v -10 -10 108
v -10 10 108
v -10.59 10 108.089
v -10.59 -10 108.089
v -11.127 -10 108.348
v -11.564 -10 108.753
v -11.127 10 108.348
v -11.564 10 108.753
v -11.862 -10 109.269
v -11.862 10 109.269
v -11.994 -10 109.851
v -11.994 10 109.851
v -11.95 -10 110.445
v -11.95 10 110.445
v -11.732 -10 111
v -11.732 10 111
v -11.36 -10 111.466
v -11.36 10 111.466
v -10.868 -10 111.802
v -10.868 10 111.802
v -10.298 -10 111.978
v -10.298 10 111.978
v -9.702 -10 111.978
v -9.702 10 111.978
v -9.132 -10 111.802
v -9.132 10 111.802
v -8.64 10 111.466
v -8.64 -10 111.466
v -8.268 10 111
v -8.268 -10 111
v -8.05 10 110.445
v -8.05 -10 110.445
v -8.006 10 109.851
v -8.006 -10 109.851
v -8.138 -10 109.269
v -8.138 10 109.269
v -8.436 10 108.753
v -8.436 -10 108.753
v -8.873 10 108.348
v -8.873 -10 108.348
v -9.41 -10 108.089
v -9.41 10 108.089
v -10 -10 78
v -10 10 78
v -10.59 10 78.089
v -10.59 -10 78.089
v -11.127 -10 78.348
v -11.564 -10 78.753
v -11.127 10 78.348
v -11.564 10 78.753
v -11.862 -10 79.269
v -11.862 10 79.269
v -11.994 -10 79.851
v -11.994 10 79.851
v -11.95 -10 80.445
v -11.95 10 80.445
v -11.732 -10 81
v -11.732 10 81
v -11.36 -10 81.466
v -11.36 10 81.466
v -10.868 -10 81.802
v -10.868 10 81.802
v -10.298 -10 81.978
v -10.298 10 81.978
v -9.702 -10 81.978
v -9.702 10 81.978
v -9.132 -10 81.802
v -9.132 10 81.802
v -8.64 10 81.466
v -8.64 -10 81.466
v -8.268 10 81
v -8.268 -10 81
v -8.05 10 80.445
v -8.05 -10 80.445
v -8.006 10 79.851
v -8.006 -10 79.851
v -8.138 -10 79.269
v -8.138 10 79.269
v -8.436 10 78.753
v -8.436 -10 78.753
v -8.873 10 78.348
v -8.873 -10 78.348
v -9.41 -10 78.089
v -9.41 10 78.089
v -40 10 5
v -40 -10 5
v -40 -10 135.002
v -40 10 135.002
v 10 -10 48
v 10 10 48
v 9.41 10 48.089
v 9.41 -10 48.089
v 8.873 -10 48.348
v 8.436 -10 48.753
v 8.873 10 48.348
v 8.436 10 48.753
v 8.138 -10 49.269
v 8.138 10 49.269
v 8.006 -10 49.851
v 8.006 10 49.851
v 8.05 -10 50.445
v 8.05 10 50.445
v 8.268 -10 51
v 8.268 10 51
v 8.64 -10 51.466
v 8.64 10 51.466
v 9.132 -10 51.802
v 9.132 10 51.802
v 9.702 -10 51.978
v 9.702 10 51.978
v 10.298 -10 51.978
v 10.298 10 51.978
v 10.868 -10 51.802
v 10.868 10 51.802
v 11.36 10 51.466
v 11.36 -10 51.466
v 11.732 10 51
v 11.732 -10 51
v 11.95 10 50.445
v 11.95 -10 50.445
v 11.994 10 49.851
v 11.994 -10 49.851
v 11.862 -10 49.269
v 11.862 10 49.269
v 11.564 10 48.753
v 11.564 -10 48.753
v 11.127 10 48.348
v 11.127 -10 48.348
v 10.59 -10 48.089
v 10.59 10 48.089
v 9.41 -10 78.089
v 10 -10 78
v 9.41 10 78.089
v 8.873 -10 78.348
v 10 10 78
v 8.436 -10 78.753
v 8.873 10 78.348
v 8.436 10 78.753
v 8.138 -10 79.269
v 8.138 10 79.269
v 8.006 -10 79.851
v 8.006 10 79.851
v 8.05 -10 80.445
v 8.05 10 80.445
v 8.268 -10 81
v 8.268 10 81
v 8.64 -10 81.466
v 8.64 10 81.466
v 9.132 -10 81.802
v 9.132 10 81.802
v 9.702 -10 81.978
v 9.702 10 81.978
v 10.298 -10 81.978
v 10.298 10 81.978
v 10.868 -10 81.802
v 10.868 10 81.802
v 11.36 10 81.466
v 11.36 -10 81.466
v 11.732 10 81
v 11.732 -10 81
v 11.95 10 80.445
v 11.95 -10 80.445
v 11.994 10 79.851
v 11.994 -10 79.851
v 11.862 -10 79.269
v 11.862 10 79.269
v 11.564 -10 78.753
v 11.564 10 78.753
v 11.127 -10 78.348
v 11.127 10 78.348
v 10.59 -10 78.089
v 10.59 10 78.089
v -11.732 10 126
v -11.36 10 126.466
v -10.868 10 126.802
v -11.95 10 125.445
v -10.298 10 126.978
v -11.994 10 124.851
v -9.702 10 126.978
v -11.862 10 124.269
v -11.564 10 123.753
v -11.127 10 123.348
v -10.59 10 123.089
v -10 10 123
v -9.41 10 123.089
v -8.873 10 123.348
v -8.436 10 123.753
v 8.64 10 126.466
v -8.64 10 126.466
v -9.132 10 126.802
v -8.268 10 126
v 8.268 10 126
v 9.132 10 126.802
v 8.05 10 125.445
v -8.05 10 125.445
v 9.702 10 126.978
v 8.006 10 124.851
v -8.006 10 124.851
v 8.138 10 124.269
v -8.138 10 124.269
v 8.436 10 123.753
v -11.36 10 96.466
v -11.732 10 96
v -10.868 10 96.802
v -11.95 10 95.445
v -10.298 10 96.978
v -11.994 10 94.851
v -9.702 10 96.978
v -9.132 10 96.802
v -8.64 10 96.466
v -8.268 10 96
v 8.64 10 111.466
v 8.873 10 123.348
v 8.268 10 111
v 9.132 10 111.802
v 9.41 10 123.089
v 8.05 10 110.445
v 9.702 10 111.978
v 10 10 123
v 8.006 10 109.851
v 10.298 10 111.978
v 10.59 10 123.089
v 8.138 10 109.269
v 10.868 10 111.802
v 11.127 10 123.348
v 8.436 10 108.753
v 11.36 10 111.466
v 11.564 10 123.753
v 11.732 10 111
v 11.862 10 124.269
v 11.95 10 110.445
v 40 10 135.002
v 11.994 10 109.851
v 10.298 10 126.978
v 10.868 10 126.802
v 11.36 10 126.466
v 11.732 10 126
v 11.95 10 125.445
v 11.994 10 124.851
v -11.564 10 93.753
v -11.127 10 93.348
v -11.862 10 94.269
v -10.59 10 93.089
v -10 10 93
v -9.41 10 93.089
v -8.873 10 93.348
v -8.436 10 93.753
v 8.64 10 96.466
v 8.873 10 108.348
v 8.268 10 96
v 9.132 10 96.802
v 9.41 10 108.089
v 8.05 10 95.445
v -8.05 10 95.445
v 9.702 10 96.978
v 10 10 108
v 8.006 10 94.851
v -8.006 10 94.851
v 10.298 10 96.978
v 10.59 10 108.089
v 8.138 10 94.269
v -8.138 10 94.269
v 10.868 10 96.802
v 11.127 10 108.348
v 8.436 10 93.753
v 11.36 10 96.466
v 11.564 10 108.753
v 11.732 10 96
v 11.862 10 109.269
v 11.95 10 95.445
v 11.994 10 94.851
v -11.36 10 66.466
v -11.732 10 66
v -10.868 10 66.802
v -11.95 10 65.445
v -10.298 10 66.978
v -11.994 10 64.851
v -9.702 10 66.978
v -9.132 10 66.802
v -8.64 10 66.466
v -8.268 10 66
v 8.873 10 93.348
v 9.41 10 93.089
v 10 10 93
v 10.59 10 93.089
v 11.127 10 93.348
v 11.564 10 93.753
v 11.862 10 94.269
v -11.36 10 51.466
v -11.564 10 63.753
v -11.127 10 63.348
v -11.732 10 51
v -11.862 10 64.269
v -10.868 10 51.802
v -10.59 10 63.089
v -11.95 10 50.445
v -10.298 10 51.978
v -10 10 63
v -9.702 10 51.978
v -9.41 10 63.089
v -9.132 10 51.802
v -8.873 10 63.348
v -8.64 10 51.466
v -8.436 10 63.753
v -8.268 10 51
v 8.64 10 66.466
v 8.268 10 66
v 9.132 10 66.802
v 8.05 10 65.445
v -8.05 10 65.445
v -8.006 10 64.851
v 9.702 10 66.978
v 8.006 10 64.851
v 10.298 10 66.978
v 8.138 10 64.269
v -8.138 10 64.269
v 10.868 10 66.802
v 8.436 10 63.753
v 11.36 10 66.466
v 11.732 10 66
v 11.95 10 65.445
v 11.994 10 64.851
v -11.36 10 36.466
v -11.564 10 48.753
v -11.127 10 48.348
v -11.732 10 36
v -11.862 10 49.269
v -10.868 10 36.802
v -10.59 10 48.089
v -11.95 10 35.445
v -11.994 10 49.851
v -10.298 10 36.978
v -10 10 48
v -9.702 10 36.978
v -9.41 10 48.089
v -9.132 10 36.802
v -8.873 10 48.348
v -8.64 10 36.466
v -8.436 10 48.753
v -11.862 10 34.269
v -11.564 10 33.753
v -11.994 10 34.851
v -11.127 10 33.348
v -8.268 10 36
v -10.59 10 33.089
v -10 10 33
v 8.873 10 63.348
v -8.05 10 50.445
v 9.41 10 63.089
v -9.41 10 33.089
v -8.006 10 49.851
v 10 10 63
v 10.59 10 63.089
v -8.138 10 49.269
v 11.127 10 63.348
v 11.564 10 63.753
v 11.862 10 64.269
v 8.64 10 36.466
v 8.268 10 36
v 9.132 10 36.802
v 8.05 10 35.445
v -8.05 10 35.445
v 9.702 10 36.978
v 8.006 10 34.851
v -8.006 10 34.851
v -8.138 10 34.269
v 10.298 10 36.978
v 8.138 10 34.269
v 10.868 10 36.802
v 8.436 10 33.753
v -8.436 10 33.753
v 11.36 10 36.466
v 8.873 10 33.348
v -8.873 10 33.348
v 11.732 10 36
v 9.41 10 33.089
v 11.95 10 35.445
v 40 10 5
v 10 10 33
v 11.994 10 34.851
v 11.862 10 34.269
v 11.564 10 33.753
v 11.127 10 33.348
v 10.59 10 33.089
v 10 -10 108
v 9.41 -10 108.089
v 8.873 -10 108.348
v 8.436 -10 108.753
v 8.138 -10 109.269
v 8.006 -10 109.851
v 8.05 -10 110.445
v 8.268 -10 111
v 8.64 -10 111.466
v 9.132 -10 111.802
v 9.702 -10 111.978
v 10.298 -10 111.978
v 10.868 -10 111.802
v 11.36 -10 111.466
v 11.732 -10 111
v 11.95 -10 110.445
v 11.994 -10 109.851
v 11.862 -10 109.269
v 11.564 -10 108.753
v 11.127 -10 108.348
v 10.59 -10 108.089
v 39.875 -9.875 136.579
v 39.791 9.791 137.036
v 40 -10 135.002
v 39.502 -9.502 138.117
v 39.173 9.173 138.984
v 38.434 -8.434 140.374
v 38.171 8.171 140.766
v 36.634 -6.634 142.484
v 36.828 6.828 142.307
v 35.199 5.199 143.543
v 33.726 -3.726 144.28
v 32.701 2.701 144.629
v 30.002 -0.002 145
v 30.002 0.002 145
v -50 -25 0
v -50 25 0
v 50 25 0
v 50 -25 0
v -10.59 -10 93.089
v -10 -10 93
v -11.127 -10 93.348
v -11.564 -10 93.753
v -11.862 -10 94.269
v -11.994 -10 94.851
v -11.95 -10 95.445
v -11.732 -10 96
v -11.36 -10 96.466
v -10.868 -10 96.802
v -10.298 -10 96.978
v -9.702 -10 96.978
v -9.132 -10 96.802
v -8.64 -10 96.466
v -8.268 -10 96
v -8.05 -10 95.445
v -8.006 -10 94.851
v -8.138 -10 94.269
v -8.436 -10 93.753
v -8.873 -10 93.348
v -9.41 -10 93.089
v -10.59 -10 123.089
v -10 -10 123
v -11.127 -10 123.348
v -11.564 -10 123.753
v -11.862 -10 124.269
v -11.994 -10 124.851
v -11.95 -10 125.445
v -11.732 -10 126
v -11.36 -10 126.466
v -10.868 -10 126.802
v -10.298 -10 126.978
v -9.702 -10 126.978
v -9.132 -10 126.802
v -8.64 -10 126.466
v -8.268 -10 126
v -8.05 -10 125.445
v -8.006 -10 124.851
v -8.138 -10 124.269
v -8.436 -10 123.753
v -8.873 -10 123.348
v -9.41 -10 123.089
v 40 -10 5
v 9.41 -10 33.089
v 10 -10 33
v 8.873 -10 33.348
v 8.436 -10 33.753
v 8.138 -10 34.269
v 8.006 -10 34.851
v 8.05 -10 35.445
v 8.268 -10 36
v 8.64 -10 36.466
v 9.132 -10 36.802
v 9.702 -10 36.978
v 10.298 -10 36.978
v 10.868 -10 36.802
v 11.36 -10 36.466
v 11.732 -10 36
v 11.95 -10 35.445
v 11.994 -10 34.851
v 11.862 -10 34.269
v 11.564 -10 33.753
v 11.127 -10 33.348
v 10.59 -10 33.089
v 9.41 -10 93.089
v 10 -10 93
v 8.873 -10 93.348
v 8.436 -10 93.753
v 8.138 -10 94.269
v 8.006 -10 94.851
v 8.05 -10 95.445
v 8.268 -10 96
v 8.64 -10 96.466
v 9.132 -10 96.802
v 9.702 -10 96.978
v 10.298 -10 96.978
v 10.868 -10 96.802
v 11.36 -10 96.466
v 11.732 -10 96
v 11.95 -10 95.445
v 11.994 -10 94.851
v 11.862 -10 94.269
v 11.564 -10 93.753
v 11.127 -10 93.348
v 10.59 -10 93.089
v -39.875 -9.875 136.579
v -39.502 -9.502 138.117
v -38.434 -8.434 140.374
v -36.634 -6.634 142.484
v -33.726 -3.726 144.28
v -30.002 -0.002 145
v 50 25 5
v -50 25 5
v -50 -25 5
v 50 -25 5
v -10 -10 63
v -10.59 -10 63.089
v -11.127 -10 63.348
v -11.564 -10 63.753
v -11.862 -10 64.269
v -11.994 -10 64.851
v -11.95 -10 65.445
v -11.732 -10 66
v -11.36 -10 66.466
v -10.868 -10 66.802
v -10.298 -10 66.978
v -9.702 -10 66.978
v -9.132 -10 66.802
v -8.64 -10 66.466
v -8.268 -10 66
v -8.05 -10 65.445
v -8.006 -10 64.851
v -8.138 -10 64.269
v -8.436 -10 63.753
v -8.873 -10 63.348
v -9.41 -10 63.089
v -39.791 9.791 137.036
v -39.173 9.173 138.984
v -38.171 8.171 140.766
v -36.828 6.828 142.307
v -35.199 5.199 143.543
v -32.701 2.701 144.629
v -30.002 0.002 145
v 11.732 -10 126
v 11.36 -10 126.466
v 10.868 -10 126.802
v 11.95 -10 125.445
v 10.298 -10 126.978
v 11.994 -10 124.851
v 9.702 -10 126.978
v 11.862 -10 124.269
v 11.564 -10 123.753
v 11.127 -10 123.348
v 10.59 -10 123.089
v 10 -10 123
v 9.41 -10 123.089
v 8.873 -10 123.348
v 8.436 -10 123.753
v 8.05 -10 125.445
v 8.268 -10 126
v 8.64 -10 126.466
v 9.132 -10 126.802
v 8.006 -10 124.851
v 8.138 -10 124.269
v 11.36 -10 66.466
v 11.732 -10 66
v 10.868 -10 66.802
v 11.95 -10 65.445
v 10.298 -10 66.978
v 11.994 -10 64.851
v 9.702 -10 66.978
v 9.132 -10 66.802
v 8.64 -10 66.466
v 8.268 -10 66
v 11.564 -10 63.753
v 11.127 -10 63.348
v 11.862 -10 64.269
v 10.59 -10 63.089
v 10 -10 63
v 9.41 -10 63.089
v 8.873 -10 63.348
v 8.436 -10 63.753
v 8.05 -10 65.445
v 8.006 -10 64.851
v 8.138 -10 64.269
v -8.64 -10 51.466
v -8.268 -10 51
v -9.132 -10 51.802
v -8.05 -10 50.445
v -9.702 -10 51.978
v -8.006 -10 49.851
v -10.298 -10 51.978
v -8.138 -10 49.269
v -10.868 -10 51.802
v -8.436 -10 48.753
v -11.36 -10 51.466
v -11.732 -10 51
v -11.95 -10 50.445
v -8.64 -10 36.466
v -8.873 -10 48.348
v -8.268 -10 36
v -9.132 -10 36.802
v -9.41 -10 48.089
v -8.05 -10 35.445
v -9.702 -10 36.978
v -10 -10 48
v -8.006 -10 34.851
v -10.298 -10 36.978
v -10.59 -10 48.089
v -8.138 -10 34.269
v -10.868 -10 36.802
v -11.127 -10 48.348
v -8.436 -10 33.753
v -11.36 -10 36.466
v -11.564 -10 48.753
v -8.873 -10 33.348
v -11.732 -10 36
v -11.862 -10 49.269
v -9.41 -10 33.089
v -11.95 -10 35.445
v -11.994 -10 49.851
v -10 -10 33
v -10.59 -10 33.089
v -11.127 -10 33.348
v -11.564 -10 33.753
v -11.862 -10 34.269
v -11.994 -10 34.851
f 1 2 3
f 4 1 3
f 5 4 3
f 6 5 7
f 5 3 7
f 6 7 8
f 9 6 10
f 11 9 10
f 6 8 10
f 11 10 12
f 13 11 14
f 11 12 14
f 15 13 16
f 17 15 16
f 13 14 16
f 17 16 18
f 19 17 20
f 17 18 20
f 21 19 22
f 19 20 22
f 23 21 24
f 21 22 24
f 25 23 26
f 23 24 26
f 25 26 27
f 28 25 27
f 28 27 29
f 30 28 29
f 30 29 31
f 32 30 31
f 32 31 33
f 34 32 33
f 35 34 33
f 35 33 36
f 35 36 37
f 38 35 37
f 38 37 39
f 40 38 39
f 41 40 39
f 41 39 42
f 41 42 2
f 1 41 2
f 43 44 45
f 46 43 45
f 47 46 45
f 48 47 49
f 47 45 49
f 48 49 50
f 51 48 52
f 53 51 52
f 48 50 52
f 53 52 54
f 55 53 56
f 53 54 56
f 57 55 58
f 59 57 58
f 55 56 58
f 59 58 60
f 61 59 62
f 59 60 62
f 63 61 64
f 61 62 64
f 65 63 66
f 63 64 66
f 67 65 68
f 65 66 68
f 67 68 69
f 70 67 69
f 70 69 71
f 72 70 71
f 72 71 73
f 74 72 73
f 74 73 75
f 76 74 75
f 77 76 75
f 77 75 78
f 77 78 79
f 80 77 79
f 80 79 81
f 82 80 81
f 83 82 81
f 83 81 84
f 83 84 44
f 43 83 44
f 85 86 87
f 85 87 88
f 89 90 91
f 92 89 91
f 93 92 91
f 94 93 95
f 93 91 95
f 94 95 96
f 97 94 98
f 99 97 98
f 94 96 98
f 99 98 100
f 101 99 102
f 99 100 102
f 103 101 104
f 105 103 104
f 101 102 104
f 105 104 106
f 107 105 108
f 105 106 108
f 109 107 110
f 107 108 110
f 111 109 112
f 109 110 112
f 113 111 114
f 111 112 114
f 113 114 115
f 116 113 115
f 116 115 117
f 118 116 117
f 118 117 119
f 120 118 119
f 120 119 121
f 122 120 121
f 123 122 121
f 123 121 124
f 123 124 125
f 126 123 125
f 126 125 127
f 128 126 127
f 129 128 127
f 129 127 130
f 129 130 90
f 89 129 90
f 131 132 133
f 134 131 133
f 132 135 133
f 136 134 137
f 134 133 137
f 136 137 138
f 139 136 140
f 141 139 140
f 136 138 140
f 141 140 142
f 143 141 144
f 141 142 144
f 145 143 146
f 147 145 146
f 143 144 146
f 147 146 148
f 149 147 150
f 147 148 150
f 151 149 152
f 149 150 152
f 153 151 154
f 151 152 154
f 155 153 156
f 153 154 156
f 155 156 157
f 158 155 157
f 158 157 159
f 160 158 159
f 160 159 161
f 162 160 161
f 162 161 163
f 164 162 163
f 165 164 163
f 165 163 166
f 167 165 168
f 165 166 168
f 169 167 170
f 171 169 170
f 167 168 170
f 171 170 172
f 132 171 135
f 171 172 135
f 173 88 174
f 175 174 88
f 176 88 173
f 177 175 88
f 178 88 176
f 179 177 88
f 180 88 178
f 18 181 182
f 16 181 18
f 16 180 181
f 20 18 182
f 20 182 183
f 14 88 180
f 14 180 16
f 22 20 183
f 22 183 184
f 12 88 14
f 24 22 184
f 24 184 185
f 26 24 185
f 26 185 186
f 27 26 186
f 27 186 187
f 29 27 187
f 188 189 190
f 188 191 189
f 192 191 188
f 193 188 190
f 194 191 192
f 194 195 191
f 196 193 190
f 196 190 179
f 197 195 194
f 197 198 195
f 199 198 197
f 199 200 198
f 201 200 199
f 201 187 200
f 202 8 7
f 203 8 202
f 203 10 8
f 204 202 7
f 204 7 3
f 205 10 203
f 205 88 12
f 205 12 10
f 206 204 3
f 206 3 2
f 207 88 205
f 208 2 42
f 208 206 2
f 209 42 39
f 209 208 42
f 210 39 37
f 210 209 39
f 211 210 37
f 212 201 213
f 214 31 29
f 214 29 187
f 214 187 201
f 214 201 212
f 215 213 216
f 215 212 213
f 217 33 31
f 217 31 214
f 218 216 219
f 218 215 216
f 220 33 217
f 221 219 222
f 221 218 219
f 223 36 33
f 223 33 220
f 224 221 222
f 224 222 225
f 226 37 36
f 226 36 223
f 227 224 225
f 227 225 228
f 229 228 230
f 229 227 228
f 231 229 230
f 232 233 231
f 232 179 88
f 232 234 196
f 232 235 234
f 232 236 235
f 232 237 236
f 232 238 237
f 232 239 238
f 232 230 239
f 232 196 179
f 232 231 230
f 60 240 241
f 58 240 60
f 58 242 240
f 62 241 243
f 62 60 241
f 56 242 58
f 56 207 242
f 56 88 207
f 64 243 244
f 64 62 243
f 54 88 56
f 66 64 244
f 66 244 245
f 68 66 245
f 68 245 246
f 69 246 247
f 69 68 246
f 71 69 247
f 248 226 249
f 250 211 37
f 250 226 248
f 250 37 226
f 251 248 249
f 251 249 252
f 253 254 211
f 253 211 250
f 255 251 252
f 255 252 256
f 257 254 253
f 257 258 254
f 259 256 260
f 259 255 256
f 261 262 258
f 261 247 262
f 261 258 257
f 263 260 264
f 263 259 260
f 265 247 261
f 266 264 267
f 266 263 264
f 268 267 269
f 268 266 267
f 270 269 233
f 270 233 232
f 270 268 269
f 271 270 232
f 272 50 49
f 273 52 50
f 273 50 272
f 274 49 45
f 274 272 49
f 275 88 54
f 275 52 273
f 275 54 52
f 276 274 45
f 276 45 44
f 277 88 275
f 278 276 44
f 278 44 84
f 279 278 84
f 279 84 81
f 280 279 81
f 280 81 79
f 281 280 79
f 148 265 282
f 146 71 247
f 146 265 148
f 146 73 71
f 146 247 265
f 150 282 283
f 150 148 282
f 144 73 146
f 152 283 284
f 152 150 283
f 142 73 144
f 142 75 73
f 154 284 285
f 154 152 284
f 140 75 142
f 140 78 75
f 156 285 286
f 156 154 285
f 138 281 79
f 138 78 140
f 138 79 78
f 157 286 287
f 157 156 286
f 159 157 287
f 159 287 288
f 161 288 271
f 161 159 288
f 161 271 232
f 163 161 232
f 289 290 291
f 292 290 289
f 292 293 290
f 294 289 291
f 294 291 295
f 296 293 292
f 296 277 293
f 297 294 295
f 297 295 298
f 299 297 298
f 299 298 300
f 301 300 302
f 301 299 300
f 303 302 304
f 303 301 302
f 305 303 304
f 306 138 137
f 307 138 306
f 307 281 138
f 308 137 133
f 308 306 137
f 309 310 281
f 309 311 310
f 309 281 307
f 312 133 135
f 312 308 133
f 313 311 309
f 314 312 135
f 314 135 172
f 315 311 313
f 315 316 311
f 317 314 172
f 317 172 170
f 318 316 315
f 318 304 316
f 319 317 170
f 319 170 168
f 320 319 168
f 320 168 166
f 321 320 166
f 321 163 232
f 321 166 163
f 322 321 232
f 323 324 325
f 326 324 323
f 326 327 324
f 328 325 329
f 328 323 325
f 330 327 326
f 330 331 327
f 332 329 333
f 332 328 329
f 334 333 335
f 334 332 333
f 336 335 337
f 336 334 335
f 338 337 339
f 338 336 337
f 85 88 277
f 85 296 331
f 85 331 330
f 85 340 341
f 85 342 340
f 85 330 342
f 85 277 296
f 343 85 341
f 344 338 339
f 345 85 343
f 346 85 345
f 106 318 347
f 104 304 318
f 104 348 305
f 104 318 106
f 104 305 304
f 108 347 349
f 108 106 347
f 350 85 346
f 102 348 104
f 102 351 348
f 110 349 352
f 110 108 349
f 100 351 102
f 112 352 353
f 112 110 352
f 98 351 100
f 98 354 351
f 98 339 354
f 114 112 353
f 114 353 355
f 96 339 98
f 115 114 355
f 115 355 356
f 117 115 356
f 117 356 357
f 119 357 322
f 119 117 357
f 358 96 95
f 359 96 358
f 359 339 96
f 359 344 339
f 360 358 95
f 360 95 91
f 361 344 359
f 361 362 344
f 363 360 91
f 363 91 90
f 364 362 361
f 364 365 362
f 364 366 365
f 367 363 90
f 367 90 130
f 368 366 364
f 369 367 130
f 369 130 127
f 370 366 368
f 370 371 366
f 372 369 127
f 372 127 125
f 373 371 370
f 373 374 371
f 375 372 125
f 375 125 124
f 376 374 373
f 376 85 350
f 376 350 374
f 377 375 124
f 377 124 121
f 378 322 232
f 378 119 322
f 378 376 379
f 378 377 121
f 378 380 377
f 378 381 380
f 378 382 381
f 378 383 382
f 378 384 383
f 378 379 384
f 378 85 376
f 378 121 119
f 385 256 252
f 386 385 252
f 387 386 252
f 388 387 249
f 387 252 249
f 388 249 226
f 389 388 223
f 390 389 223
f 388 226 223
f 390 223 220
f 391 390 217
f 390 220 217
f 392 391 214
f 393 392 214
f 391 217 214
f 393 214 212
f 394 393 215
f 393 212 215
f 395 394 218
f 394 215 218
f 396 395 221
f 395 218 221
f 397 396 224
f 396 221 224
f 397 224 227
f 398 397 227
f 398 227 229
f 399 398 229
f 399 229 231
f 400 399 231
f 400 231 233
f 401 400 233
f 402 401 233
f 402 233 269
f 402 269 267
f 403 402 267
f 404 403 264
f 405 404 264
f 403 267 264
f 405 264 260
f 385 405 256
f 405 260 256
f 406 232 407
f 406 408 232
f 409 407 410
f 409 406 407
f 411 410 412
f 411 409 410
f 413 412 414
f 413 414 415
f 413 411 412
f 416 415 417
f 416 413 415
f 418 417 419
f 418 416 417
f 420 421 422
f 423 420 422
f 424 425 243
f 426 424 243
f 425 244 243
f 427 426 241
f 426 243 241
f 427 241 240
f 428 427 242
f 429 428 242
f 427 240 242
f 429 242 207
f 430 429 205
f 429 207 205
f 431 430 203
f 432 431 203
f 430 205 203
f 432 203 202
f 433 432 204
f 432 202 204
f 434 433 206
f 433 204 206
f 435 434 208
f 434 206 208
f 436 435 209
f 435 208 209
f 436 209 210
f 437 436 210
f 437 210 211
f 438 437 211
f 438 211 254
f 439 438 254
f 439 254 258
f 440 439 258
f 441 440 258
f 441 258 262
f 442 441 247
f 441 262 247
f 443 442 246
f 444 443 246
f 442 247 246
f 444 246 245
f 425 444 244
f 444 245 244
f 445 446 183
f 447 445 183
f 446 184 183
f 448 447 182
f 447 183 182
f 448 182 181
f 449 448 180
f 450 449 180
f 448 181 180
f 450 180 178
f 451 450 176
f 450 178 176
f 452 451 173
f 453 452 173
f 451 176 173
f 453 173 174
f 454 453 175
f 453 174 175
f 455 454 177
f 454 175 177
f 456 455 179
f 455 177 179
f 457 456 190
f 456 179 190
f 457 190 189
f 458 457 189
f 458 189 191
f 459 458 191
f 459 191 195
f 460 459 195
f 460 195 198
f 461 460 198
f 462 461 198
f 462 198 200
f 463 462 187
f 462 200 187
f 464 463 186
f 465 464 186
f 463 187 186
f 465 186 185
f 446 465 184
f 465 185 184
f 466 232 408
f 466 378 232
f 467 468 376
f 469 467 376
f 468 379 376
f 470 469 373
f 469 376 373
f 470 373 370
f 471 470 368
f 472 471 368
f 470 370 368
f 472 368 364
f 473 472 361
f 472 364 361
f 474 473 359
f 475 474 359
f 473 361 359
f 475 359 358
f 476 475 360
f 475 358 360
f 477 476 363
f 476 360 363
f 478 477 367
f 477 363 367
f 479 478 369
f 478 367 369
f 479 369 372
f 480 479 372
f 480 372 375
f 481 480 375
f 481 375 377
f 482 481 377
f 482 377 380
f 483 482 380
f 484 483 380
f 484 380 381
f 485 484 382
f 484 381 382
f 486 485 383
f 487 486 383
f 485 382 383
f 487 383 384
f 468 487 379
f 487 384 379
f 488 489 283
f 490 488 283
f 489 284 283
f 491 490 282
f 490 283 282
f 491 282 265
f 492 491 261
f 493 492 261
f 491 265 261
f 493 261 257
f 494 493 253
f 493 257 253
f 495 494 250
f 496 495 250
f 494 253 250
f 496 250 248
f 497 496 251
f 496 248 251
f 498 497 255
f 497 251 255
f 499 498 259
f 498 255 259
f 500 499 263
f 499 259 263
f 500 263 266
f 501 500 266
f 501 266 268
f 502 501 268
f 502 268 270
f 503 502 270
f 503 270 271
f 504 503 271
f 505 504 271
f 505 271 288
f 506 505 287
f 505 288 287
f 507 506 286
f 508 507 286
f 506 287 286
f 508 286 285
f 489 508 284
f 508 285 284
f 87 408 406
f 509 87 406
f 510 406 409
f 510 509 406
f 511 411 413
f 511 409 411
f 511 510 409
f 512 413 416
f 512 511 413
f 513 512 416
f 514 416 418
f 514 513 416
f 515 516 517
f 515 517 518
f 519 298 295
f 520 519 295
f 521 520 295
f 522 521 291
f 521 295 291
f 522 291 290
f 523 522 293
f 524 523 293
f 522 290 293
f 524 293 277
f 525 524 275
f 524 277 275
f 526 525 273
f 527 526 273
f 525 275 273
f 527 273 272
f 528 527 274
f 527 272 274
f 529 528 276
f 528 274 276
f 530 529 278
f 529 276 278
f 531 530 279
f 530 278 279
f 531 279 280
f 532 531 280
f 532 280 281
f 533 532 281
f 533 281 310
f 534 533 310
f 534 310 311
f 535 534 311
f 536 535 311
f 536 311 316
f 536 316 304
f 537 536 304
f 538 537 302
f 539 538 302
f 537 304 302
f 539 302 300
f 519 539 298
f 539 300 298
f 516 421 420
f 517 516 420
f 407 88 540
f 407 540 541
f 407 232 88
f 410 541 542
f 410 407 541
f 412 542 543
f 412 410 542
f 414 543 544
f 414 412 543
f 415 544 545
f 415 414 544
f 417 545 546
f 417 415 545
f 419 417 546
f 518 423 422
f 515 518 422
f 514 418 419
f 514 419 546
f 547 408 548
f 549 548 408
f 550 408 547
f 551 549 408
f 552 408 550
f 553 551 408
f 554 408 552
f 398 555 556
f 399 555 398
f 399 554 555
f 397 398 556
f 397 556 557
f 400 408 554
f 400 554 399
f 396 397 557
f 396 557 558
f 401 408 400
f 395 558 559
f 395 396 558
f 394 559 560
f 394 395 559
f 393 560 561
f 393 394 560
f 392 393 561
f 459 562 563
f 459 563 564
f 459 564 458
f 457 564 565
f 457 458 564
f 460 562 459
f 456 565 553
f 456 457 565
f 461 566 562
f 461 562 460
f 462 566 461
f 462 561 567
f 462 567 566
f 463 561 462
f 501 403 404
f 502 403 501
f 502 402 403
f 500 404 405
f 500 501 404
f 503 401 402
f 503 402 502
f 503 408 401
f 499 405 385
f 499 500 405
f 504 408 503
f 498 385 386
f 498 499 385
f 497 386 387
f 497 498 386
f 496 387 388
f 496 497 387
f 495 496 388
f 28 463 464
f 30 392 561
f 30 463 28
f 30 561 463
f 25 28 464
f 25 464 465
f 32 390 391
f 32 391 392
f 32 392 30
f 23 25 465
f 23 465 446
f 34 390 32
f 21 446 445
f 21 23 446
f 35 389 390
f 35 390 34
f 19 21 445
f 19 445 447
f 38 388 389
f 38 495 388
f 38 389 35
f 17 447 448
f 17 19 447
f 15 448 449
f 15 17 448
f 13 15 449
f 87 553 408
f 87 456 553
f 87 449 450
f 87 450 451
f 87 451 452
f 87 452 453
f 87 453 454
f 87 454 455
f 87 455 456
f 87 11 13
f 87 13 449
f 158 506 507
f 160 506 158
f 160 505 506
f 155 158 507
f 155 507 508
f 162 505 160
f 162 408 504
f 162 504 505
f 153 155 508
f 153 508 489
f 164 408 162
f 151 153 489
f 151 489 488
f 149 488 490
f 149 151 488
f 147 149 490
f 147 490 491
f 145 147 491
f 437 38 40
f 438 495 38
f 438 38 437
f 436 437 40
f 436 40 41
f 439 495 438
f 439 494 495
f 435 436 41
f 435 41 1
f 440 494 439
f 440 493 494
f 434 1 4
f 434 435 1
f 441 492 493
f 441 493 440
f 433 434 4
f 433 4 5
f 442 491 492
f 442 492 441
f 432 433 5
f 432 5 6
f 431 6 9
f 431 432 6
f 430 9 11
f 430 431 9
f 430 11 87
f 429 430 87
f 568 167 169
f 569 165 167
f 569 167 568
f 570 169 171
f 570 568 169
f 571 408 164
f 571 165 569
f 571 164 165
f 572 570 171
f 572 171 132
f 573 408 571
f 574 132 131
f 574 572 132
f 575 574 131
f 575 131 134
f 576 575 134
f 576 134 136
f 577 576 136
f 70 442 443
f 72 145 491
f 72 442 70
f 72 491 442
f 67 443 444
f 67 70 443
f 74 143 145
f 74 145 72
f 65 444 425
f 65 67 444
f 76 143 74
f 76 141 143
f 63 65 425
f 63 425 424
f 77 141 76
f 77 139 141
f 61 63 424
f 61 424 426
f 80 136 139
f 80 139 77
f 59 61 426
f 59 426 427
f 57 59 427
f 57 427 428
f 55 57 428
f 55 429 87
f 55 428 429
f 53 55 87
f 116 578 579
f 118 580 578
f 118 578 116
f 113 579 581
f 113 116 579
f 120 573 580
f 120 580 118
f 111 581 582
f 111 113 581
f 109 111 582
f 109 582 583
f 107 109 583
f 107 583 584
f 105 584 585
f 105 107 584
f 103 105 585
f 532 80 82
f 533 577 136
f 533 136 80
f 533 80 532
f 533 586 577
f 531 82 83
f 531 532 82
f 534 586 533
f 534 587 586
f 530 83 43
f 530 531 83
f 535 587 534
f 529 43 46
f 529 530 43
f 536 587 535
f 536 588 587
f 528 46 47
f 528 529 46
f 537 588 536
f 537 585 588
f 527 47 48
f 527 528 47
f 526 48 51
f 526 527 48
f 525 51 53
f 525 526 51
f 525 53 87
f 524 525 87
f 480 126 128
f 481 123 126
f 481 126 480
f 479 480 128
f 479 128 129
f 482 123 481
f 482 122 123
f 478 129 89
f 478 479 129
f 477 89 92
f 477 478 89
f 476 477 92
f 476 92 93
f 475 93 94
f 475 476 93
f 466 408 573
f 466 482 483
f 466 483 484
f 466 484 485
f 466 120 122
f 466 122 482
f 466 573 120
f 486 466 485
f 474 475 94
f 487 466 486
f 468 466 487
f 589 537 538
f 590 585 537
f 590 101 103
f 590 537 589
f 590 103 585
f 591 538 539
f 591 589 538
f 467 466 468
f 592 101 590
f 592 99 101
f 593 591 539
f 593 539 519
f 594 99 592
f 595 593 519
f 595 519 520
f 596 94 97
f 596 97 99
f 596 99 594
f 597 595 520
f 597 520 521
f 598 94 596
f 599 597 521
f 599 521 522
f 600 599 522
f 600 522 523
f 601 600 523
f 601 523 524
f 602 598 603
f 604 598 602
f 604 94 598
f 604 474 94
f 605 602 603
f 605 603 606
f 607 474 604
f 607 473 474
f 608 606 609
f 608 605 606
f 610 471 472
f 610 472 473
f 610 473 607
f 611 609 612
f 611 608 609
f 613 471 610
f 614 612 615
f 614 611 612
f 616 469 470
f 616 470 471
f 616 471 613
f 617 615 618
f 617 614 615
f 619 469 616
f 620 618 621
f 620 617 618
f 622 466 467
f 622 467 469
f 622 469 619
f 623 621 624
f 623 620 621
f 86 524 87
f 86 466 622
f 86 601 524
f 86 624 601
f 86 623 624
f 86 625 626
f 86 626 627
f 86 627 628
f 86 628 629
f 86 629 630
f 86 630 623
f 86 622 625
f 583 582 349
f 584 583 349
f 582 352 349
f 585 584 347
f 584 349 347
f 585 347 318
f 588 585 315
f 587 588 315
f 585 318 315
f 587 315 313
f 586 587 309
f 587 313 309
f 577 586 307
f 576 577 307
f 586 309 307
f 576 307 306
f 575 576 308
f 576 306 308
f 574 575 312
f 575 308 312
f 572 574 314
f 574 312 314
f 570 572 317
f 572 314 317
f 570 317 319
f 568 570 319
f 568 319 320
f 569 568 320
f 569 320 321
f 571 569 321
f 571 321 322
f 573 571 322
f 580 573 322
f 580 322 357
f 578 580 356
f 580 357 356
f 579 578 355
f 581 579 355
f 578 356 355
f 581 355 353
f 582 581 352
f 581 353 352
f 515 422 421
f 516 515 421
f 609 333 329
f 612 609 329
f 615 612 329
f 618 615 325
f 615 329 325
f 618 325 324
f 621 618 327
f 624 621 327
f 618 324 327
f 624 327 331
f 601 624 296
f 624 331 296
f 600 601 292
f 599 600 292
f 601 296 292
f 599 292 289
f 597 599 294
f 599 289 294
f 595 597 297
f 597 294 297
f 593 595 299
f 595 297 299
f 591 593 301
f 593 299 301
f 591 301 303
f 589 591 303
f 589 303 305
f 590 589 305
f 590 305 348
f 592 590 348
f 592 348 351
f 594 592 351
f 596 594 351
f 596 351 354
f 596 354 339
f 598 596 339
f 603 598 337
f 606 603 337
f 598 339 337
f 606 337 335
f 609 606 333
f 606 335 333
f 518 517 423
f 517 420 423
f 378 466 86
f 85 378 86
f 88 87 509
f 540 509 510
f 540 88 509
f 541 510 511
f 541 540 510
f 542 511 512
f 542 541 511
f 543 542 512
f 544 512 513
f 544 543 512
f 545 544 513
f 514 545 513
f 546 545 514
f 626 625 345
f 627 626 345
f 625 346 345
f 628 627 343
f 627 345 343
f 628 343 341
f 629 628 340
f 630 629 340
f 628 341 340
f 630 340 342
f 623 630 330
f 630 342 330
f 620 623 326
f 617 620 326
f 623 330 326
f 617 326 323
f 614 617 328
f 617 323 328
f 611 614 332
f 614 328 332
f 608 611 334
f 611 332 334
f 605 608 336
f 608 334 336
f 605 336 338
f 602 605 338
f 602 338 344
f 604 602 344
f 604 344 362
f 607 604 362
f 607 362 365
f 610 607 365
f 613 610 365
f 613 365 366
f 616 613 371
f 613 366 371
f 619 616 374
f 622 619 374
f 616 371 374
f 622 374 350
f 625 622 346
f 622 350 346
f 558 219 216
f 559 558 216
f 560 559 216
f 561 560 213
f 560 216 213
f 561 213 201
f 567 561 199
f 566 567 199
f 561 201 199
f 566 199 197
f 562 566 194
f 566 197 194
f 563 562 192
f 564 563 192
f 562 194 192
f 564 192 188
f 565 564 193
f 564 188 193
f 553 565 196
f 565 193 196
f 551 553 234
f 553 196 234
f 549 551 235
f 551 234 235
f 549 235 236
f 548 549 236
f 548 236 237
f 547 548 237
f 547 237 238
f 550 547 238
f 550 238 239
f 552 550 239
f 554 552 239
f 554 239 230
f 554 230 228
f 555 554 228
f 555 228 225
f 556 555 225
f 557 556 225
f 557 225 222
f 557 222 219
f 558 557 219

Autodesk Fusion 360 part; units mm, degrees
sketch "Sketch1" plane through (0, 0, 0) normal (0, 0, 1) x (1, 0, 0) in component "base"
  line L0 (-50, -25) -> (50, -25)
  line L1 (50, -25) -> (50, 25)
  line L2 (50, 25) -> (-50, 25)
  line L3 (-50, 25) -> (-50, -25)
extrude "Extrude1" add sketch "Sketch1" along normal blind 5 makes body 1 in component "base"
sketch "Sketch1 (2)" plane through (0, 0, 5) normal (0, 0, 1) x (-1, 0, 0) in component "Component"
  line L0 (50, -25) -> (50, 25)
  line L1 (50, 25) -> (-50, 25)
  line L2 (-50, 25) -> (-50, -25)
  line L3 (-50, -25) -> (50, -25)
  line L4 (40, -10) -> (-40, -10)
  line L5 (-40, -10) -> (-40, 10)
  line L6 (-40, 10) -> (40, 10)
  line L7 (40, 10) -> (40, -10)
  dimension "d3" = 80
extrude "Extrude1'" add sketch "Sketch1 (2)" along normal blind 140 separate body contours L4 L5 L6 L7 makes body 2 in component "Component"
sketch "Sketch2" plane through (0, -10, 0) normal (0, -1, 0) x (1, 0, 0) in component "Component"
  line L0 (-40, 5) -> (40, 5)
  line L1 (40, 5) -> (40, 145)
  line L2 (40, 145) -> (-40, 145)
  line L3 (-40, 145) -> (-40, 5)
sketch "Sketch1 (3)" plane through (0, -10, 0) normal (0, -1, 0) x (1, 0, 0) in component "holes"
  circle A0 centre (-10, 125) radius 2
  circle A1 centre (10, 125) radius 2
  circle A2 centre (-10, 110) radius 2
  circle A3 centre (10, 110) radius 2
  circle A4 centre (-10, 95) radius 2
  circle A5 centre (10, 95) radius 2
  circle A6 centre (-10, 80) radius 2
  circle A7 centre (10, 80) radius 2
  circle A8 centre (-10, 65) radius 2
  circle A9 centre (10, 65) radius 2
  circle A10 centre (-10, 50) radius 2
  circle A11 centre (10, 50) radius 2
  circle A12 centre (-10, 35) radius 2
  circle A13 centre (10, 35) radius 2
  dimension "d7" = 4
  dimension "d8" = 4
  dimension "d9" = 4
  dimension "d10" = 4
  dimension "d11" = 4
  dimension "d12" = 4
  dimension "d13" = 4
  dimension "d14" = 4
  dimension "d15" = 4
  dimension "d16" = 4
  dimension "d17" = 4
  dimension "d18" = 4
  dimension "d19" = 4
  dimension "d20" = 4
hole "Hole1" at (-10, -10, 125) at (10, -10, 125) at (-10, -10, 110) at (10, -10, 110) at (10, -10, 95) at (-10, -10, 95) at (-10, -10, 80) at (10, -10, 80) at (10, -10, 65) at (-10, -10, 65) at (-10, -10, 50) at (10, -10, 50) at (10, -10, 35) at (-10, -10, 35) direction (0, 1, 0) diameter 4 depth 45 tip angle 118 bodies 2 in component "Component"
fillet "Fillet1" radius 10 1 faces at (-13.3333, 3.3333, 145) on bodies 2 in component "Component"
component "base" placed x (1, 0, 0) y (0, 1, 0) z (0, 0, 1) at (0, 0, 0)
component "Component" placed x (1, 0, 0) y (0, 1, 0) z (0, 0, 1) at (0, 0, 0)
component "holes" placed x (1, 0, 0) y (0, 1, 0) z (0, 0, 1) at (0, 0, 0)
